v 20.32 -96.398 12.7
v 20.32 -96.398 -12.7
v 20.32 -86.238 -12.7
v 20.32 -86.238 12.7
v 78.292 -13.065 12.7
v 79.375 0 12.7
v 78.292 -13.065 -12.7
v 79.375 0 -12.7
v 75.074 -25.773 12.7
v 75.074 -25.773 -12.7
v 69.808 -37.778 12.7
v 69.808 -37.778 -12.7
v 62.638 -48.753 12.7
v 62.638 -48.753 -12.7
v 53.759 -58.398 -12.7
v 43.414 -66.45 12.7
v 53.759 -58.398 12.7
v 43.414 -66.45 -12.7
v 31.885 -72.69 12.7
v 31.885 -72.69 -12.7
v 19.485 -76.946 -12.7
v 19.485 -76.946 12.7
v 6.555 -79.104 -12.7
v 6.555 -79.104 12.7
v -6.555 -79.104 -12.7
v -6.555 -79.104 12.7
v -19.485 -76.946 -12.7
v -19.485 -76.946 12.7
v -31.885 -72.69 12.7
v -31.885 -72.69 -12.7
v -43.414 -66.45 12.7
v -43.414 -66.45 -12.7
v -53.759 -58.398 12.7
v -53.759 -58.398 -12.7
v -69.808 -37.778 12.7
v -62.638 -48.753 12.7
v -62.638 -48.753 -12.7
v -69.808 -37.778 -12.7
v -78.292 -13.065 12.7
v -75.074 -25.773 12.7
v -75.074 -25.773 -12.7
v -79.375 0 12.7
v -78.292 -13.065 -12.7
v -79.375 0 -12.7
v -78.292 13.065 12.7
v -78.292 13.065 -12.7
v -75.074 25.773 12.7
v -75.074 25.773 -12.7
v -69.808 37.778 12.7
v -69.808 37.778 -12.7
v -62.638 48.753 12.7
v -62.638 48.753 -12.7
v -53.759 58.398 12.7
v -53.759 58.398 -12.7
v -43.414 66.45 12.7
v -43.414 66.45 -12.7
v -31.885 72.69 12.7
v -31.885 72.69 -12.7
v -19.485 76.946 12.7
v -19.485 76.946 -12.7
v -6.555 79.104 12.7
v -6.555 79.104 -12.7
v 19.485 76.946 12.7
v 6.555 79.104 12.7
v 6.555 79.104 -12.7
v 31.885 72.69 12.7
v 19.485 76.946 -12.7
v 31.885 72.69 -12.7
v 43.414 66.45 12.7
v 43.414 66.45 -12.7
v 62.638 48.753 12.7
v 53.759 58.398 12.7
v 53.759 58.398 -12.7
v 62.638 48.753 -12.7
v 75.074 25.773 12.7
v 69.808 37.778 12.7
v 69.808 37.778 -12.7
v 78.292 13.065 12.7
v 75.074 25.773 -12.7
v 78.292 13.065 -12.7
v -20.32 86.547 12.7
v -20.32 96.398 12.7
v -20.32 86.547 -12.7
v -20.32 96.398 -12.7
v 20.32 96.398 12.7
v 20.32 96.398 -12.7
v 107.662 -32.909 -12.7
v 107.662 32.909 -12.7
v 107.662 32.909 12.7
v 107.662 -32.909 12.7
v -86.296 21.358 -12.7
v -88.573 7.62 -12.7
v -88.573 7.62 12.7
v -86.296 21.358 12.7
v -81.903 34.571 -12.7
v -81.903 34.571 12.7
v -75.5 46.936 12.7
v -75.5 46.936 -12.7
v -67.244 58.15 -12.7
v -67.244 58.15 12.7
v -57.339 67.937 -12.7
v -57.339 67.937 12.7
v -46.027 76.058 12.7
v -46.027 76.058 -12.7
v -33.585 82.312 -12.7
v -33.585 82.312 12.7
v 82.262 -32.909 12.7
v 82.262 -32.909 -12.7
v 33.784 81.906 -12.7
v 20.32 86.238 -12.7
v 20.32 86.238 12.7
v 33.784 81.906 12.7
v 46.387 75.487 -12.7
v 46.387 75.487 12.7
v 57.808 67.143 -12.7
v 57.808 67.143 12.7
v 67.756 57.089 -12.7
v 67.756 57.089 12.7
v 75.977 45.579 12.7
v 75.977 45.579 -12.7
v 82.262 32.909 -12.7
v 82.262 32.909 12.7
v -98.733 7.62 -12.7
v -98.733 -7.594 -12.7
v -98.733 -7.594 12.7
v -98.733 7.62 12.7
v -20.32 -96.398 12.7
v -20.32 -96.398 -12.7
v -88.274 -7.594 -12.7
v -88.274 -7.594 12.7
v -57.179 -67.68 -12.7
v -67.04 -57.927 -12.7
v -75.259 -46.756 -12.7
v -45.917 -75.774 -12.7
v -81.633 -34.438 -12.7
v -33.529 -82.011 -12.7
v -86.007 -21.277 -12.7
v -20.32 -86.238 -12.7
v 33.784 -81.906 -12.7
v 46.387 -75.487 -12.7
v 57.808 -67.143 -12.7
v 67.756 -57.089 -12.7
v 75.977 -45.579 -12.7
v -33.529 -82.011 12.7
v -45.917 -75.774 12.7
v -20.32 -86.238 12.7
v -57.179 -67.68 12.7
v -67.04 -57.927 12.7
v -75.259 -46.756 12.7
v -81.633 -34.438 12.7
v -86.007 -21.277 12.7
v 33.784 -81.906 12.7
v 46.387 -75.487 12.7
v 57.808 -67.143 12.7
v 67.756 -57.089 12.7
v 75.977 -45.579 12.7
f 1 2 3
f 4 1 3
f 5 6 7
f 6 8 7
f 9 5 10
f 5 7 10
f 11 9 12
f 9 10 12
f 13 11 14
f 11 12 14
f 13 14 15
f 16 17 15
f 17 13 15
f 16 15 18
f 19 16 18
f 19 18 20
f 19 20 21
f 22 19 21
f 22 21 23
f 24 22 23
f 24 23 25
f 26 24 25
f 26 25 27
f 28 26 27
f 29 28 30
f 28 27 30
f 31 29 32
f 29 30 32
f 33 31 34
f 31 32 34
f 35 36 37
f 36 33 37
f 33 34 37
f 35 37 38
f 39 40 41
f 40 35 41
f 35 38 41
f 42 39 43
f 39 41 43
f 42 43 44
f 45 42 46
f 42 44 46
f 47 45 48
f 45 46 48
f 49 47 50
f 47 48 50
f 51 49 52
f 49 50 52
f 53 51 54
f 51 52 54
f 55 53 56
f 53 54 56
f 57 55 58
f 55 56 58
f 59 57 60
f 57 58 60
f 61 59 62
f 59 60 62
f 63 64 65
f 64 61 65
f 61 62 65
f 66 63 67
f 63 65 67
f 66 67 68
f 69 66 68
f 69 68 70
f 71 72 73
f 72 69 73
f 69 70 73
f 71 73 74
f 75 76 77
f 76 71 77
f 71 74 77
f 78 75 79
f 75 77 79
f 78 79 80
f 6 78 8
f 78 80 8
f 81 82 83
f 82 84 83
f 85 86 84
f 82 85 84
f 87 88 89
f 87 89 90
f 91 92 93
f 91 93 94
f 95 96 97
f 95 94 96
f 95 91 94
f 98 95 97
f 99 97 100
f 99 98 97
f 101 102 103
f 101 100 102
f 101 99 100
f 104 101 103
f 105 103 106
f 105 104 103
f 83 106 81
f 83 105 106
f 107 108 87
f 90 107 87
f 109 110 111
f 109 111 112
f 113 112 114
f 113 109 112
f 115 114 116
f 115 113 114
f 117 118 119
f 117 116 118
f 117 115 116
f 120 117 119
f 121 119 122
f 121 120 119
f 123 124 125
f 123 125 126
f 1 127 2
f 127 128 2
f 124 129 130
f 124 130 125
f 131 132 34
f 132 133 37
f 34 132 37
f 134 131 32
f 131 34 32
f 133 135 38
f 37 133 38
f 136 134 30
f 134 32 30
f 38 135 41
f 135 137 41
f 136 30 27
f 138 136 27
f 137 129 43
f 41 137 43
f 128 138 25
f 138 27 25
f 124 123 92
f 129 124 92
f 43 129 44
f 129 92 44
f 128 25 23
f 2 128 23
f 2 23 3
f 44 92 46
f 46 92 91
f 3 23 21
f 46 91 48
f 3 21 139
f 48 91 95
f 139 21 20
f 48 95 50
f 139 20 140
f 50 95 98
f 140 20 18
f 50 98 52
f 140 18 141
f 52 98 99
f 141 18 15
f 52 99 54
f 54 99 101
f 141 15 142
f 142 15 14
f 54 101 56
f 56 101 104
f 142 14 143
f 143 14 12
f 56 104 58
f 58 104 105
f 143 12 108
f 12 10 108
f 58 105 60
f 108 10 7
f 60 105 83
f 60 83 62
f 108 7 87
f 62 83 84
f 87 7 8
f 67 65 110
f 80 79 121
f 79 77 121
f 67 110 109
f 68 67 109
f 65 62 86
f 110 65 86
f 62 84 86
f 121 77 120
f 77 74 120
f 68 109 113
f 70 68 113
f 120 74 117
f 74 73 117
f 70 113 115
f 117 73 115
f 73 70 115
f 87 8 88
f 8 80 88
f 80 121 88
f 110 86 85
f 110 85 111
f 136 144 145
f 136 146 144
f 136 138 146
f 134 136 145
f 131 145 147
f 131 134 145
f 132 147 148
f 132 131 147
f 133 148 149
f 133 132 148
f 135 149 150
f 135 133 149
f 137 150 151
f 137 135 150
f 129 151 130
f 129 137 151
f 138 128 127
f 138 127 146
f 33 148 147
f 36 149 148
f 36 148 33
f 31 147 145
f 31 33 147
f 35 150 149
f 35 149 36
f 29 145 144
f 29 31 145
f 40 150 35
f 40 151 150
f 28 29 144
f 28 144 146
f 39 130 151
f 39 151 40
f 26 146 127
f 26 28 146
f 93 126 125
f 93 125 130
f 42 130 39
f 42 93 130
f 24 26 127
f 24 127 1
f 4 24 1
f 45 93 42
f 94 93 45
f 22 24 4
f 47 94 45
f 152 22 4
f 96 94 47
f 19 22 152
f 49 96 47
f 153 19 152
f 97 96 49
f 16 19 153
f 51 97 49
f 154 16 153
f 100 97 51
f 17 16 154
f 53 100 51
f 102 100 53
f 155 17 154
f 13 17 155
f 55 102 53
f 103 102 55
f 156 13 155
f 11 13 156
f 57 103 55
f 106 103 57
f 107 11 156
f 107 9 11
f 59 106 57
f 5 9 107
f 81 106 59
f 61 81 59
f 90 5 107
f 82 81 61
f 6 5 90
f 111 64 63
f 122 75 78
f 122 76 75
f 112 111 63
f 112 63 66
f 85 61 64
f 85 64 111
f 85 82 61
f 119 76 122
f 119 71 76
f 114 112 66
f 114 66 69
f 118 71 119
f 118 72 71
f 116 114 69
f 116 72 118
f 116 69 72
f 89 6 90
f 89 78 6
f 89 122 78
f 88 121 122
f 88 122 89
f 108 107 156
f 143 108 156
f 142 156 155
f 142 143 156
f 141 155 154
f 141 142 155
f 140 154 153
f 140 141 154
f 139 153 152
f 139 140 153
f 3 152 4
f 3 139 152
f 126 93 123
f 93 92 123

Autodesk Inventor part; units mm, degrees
ref_plane "YZ Plane" through (0, 0, 0) normal (1, 0, 0) x (0, 1, 0)
ref_plane "XZ Plane" through (0, 0, 0) normal (0, 1, 0) x (-1, 0, 0)
ref_plane "XY Plane" through (0, 0, 0) normal (0, 0, 1) x (1, 0, 0)
sketch "Sketch1" plane through (0, 0, 0) normal (0, 0, 1) x (1, 0, 0)
  circle A0 centre (0, 0) radius 79.375
  line L0 (82.2618, 32.9086) -> (107.6618, 32.9086)
  line L1 (107.6618, 32.9086) -> (107.6618, -0.1114)
  line L2 (-88.5728, 7.62) -> (-98.7328, 7.62)
  line L3 (-98.7328, 7.62) -> (-98.7328, 0)
  line L4 (0, 96.3985) -> (20.32, 96.3985)
  line L5 (20.32, 96.3985) -> (20.32, 86.2385)
  line L6 (82.2618, -32.9086) -> (107.6618, -32.9086)
  line L7 (107.6618, -32.9086) -> (107.6618, -0.1114)
  line L8 (-88.2741, -7.5943) -> (-98.7328, -7.5943)
  line L9 (-98.7328, -7.5943) -> (-98.7328, 0)
  line L10 (0, 96.3985) -> (-20.32, 96.3985)
  line L11 (-20.32, 96.3985) -> (-20.32, 86.5466)
  arc A1 (-88.2741, -7.5943) -> (-20.32, -86.2385) centre (0, 0) ccw
  arc A2 (-20.32, 86.5466) -> (-88.5728, 7.62) centre (0, 0) ccw
  arc A3 (20.32, -86.2385) -> (82.2618, -32.9086) centre (0, 0) ccw
  arc A4 (82.2618, 32.9086) -> (20.32, 86.2385) centre (0, 0) ccw
  line L12 (-88.9, 0) -> (88.9, 0) construction
  line L13 (0, -96.3985) -> (20.32, -96.3985)
  line L14 (20.32, -96.3985) -> (20.32, -86.2385)
  line L15 (0, -96.3985) -> (-20.32, -96.3985)
  line L16 (-20.32, -96.3985) -> (-20.32, -86.2385)
  arc A5 (-20.32, 86.5466) -> (-88.5728, 7.62) centre (0, 0) ccw
  arc A6 (82.2618, 32.9086) -> (20.32, 86.2385) centre (0, 0) ccw
  arc A7 (-88.2741, -7.5943) -> (-20.32, -86.2385) centre (0, 0) ccw
  arc A8 (20.32, -86.2385) -> (82.2618, -32.9086) centre (0, 0) ccw
  line L17 (0, 0) -> (0, 96.3985) construction
  line L18 (0, 0) -> (0, -96.3985) construction
  dimension "d2" = 25.4
  dimension "d5" = 10.16
  dimension "d7" = 10.16
  dimension "d8" = 7.62
  dimension "d10" = 33.02
  dimension "d14" = 158.75
  dimension "d15" = 177.8
  dimension "d24" = 20.32
  dimension "d25" = 20.32
  dimension "d26" = 40.64
extrude "Extrusion2" add sketch "Sketch1" along normal mid plane 25.4
properties part number "celestronTubeBracket" material "Aluminum 6061"
